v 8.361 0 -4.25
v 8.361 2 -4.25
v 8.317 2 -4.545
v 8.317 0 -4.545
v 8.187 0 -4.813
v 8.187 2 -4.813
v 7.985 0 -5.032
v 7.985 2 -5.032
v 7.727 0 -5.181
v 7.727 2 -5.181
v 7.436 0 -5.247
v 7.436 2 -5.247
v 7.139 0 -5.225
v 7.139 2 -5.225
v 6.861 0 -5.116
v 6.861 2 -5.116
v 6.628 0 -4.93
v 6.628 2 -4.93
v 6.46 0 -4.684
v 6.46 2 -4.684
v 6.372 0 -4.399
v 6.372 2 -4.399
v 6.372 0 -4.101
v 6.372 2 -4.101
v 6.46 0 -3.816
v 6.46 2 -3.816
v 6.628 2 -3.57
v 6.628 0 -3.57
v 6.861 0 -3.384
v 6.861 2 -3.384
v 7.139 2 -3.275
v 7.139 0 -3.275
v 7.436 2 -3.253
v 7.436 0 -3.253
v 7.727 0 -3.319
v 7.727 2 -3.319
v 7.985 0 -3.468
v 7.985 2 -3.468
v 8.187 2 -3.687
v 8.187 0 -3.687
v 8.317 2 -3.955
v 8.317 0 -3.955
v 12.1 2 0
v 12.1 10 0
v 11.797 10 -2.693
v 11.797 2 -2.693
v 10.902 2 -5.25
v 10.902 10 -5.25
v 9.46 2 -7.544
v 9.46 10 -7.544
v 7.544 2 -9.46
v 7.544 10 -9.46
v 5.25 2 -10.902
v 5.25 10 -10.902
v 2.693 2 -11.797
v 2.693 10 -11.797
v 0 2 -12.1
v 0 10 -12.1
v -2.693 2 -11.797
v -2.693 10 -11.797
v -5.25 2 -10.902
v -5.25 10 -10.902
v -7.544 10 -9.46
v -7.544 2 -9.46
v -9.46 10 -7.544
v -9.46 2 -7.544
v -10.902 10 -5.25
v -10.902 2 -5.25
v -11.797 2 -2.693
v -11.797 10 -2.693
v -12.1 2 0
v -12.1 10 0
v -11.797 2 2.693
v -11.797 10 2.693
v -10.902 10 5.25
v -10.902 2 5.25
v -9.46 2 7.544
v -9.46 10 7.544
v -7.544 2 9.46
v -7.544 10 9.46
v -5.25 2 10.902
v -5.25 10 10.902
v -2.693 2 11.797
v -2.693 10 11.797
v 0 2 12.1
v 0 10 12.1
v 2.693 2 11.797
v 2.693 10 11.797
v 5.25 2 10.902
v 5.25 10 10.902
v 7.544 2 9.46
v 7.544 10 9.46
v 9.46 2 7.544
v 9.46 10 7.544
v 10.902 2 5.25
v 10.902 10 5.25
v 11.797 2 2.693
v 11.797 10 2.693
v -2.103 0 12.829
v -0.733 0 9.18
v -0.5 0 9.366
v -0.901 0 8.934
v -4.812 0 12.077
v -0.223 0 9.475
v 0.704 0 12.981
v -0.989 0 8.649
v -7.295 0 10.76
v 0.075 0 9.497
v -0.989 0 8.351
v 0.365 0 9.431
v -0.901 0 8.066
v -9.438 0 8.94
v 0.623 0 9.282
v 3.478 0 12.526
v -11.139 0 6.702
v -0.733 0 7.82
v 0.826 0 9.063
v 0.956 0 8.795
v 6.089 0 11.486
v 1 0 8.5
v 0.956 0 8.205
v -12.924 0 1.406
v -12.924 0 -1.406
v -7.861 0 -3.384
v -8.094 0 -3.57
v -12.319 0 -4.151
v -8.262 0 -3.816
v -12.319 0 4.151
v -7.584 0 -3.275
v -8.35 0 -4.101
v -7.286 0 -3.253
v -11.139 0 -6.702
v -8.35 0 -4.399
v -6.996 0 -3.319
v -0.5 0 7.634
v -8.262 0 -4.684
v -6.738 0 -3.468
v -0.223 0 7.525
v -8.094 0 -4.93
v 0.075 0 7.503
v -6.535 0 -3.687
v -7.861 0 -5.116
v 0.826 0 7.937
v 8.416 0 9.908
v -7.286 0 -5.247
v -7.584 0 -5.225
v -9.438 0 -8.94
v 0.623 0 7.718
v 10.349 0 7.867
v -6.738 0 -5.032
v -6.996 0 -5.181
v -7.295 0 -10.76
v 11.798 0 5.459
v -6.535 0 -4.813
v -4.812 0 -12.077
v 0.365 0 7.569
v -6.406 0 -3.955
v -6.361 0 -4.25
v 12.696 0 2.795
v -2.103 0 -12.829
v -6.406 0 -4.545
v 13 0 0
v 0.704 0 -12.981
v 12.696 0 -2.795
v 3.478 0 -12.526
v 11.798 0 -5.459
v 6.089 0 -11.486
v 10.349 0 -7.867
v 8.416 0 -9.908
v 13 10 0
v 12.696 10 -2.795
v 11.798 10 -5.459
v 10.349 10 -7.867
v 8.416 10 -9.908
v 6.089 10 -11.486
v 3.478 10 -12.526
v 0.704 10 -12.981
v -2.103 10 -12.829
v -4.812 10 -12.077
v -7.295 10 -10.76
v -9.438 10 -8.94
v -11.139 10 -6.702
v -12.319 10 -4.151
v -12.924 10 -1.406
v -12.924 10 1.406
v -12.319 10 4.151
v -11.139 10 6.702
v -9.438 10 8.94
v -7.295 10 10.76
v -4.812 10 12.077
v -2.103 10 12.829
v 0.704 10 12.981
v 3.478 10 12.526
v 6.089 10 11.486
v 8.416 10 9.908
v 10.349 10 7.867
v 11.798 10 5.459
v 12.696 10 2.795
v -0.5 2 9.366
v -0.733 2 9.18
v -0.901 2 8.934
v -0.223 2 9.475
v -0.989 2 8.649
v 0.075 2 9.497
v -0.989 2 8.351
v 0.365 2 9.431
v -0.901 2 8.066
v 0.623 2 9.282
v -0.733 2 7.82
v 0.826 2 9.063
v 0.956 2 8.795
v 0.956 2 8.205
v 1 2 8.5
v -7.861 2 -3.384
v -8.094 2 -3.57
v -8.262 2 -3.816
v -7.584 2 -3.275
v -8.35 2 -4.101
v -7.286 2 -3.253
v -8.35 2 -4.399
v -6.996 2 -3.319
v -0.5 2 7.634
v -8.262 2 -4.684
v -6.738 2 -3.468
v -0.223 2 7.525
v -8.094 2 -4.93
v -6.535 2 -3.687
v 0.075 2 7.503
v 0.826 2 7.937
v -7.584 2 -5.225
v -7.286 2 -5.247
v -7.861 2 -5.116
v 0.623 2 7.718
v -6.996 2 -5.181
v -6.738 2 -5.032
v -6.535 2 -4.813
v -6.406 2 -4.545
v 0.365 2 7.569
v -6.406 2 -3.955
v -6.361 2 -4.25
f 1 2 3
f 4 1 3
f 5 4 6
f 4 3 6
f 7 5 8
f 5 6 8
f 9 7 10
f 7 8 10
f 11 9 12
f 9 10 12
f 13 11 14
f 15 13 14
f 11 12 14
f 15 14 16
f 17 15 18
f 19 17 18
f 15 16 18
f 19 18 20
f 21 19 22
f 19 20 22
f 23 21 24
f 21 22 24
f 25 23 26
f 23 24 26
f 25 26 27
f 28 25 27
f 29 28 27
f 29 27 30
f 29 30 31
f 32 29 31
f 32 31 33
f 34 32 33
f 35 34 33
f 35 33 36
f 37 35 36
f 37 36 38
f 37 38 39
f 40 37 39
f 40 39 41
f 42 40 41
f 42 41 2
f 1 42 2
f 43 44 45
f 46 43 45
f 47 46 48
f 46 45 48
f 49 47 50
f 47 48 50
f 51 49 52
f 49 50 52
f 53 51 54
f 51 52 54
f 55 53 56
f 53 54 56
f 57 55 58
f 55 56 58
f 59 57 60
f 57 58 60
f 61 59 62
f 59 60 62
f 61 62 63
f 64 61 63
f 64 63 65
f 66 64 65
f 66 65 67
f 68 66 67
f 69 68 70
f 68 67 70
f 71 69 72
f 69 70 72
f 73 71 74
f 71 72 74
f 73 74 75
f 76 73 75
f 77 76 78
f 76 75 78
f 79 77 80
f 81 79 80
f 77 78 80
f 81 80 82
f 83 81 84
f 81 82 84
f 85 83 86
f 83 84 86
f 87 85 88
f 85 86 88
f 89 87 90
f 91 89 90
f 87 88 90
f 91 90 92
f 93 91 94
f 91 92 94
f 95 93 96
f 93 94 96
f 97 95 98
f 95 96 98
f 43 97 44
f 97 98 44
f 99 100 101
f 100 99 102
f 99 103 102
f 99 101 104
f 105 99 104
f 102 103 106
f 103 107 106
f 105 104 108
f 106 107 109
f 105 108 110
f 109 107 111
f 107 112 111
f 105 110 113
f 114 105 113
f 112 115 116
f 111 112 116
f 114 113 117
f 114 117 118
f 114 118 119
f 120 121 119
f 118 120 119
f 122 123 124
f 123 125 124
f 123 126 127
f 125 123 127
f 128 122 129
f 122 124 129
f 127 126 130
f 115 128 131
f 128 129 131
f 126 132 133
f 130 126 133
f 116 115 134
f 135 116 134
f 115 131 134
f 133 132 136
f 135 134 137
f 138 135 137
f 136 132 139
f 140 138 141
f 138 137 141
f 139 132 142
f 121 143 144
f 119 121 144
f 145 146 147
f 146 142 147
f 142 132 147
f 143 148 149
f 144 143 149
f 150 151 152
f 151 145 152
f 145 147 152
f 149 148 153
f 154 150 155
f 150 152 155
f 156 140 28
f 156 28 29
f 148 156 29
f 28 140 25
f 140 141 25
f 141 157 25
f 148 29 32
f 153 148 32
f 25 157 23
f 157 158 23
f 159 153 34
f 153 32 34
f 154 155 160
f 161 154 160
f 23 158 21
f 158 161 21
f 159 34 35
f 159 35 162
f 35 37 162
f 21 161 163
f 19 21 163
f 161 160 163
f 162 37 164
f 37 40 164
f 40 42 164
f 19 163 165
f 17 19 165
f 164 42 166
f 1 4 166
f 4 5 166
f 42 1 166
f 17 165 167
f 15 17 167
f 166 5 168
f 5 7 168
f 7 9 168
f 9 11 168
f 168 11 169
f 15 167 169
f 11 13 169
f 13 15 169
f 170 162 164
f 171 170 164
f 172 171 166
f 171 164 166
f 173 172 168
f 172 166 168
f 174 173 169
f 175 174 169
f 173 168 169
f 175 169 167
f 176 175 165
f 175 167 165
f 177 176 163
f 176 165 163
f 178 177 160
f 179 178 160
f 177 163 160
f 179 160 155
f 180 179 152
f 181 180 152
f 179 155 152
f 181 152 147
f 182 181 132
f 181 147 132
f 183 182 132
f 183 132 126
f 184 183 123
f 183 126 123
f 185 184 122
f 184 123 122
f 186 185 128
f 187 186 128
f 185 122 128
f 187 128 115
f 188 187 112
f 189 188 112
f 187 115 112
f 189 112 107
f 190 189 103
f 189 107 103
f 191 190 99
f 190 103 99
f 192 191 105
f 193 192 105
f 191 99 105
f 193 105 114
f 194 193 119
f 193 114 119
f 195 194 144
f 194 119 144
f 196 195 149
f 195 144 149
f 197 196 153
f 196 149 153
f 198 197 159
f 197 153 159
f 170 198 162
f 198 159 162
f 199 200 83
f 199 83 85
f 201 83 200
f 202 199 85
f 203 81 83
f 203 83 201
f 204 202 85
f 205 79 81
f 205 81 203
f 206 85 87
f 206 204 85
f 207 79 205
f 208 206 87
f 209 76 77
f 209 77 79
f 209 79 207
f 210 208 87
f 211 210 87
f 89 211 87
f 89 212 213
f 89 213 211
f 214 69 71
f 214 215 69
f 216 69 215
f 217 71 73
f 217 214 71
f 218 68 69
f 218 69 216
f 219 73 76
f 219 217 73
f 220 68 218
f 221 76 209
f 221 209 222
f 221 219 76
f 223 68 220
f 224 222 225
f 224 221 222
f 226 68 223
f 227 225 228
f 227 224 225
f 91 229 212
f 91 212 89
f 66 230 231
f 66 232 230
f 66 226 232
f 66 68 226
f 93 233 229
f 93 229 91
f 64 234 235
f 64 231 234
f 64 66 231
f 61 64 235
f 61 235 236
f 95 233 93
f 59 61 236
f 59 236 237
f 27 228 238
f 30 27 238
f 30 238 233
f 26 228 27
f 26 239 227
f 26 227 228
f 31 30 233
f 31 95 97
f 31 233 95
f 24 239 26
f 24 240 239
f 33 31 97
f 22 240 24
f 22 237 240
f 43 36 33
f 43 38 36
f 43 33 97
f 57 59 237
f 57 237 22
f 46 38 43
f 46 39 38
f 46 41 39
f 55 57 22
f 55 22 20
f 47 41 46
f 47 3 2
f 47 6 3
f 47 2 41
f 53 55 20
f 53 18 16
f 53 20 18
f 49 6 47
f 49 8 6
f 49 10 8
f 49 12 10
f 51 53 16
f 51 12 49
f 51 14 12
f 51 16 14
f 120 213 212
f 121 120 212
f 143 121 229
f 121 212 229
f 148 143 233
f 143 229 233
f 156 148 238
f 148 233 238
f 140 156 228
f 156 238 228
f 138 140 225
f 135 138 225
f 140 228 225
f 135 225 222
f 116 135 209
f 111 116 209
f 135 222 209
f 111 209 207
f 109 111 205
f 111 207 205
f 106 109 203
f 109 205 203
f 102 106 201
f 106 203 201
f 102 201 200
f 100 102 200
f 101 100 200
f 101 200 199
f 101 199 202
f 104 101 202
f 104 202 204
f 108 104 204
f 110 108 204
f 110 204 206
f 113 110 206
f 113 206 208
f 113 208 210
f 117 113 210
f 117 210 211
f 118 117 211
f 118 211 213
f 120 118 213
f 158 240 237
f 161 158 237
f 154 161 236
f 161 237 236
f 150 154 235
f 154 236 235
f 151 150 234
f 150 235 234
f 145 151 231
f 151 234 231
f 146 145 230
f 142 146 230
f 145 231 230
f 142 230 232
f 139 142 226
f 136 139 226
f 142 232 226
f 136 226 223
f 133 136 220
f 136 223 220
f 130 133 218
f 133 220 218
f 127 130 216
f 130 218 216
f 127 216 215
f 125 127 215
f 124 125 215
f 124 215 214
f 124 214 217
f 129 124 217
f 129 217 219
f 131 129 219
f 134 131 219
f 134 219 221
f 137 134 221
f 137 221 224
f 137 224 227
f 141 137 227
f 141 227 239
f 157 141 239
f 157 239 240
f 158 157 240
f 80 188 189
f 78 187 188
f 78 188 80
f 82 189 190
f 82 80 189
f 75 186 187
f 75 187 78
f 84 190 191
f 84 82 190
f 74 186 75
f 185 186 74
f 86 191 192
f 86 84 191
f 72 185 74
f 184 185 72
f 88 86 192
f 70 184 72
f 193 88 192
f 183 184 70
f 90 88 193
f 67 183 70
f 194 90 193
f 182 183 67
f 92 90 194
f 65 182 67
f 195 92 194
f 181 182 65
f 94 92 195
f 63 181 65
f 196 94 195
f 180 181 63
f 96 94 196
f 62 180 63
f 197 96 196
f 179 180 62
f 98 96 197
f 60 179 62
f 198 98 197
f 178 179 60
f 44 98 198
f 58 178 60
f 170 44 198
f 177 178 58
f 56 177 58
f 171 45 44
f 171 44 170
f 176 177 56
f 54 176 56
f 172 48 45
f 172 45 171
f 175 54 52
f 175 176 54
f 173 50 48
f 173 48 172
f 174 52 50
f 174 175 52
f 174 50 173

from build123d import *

# Parameters (mm, degrees)
SKETCH2_R           = 13
BOSS_EXTRUDE2_DEPTH = 10
SKETCH5_R           = 12.1
CUT_EXTRUDE2_DEPTH  = 8
SKETCH6_R           = 1
CUT_EXTRUDE3_DEPTH  = 8


with BuildPart() as part:
    # Sketch2 → Boss-Extrude2 (new body)
    with BuildSketch(Plane(origin=(0, 0, 0), x_dir=(1, 0, 0), z_dir=(0, 1, 0))):
        Circle(SKETCH2_R)
    extrude(amount=BOSS_EXTRUDE2_DEPTH)

    # Sketch5 → Cut-Extrude2 (cut)
    with BuildSketch(Plane(origin=(0, 10, 0), x_dir=(1, 0, 0), z_dir=(0, 1, 0))):
        Circle(SKETCH5_R)
    extrude(amount=-CUT_EXTRUDE2_DEPTH, mode=Mode.SUBTRACT)

    # Sketch6 → Cut-Extrude3 (cut)
    with BuildSketch(Plane(origin=(0, 2, 0), x_dir=(1, 0, 0), z_dir=(0, 1, 0))):
        with Locations((0, -8.5)):
            Circle(SKETCH6_R)
        with Locations((-7.361215932, 4.25)):
            Circle(SKETCH6_R)
        with Locations((7.361215932, 4.25)):
            Circle(SKETCH6_R)
    extrude(amount=-CUT_EXTRUDE3_DEPTH, mode=Mode.SUBTRACT)


solid = part.part
